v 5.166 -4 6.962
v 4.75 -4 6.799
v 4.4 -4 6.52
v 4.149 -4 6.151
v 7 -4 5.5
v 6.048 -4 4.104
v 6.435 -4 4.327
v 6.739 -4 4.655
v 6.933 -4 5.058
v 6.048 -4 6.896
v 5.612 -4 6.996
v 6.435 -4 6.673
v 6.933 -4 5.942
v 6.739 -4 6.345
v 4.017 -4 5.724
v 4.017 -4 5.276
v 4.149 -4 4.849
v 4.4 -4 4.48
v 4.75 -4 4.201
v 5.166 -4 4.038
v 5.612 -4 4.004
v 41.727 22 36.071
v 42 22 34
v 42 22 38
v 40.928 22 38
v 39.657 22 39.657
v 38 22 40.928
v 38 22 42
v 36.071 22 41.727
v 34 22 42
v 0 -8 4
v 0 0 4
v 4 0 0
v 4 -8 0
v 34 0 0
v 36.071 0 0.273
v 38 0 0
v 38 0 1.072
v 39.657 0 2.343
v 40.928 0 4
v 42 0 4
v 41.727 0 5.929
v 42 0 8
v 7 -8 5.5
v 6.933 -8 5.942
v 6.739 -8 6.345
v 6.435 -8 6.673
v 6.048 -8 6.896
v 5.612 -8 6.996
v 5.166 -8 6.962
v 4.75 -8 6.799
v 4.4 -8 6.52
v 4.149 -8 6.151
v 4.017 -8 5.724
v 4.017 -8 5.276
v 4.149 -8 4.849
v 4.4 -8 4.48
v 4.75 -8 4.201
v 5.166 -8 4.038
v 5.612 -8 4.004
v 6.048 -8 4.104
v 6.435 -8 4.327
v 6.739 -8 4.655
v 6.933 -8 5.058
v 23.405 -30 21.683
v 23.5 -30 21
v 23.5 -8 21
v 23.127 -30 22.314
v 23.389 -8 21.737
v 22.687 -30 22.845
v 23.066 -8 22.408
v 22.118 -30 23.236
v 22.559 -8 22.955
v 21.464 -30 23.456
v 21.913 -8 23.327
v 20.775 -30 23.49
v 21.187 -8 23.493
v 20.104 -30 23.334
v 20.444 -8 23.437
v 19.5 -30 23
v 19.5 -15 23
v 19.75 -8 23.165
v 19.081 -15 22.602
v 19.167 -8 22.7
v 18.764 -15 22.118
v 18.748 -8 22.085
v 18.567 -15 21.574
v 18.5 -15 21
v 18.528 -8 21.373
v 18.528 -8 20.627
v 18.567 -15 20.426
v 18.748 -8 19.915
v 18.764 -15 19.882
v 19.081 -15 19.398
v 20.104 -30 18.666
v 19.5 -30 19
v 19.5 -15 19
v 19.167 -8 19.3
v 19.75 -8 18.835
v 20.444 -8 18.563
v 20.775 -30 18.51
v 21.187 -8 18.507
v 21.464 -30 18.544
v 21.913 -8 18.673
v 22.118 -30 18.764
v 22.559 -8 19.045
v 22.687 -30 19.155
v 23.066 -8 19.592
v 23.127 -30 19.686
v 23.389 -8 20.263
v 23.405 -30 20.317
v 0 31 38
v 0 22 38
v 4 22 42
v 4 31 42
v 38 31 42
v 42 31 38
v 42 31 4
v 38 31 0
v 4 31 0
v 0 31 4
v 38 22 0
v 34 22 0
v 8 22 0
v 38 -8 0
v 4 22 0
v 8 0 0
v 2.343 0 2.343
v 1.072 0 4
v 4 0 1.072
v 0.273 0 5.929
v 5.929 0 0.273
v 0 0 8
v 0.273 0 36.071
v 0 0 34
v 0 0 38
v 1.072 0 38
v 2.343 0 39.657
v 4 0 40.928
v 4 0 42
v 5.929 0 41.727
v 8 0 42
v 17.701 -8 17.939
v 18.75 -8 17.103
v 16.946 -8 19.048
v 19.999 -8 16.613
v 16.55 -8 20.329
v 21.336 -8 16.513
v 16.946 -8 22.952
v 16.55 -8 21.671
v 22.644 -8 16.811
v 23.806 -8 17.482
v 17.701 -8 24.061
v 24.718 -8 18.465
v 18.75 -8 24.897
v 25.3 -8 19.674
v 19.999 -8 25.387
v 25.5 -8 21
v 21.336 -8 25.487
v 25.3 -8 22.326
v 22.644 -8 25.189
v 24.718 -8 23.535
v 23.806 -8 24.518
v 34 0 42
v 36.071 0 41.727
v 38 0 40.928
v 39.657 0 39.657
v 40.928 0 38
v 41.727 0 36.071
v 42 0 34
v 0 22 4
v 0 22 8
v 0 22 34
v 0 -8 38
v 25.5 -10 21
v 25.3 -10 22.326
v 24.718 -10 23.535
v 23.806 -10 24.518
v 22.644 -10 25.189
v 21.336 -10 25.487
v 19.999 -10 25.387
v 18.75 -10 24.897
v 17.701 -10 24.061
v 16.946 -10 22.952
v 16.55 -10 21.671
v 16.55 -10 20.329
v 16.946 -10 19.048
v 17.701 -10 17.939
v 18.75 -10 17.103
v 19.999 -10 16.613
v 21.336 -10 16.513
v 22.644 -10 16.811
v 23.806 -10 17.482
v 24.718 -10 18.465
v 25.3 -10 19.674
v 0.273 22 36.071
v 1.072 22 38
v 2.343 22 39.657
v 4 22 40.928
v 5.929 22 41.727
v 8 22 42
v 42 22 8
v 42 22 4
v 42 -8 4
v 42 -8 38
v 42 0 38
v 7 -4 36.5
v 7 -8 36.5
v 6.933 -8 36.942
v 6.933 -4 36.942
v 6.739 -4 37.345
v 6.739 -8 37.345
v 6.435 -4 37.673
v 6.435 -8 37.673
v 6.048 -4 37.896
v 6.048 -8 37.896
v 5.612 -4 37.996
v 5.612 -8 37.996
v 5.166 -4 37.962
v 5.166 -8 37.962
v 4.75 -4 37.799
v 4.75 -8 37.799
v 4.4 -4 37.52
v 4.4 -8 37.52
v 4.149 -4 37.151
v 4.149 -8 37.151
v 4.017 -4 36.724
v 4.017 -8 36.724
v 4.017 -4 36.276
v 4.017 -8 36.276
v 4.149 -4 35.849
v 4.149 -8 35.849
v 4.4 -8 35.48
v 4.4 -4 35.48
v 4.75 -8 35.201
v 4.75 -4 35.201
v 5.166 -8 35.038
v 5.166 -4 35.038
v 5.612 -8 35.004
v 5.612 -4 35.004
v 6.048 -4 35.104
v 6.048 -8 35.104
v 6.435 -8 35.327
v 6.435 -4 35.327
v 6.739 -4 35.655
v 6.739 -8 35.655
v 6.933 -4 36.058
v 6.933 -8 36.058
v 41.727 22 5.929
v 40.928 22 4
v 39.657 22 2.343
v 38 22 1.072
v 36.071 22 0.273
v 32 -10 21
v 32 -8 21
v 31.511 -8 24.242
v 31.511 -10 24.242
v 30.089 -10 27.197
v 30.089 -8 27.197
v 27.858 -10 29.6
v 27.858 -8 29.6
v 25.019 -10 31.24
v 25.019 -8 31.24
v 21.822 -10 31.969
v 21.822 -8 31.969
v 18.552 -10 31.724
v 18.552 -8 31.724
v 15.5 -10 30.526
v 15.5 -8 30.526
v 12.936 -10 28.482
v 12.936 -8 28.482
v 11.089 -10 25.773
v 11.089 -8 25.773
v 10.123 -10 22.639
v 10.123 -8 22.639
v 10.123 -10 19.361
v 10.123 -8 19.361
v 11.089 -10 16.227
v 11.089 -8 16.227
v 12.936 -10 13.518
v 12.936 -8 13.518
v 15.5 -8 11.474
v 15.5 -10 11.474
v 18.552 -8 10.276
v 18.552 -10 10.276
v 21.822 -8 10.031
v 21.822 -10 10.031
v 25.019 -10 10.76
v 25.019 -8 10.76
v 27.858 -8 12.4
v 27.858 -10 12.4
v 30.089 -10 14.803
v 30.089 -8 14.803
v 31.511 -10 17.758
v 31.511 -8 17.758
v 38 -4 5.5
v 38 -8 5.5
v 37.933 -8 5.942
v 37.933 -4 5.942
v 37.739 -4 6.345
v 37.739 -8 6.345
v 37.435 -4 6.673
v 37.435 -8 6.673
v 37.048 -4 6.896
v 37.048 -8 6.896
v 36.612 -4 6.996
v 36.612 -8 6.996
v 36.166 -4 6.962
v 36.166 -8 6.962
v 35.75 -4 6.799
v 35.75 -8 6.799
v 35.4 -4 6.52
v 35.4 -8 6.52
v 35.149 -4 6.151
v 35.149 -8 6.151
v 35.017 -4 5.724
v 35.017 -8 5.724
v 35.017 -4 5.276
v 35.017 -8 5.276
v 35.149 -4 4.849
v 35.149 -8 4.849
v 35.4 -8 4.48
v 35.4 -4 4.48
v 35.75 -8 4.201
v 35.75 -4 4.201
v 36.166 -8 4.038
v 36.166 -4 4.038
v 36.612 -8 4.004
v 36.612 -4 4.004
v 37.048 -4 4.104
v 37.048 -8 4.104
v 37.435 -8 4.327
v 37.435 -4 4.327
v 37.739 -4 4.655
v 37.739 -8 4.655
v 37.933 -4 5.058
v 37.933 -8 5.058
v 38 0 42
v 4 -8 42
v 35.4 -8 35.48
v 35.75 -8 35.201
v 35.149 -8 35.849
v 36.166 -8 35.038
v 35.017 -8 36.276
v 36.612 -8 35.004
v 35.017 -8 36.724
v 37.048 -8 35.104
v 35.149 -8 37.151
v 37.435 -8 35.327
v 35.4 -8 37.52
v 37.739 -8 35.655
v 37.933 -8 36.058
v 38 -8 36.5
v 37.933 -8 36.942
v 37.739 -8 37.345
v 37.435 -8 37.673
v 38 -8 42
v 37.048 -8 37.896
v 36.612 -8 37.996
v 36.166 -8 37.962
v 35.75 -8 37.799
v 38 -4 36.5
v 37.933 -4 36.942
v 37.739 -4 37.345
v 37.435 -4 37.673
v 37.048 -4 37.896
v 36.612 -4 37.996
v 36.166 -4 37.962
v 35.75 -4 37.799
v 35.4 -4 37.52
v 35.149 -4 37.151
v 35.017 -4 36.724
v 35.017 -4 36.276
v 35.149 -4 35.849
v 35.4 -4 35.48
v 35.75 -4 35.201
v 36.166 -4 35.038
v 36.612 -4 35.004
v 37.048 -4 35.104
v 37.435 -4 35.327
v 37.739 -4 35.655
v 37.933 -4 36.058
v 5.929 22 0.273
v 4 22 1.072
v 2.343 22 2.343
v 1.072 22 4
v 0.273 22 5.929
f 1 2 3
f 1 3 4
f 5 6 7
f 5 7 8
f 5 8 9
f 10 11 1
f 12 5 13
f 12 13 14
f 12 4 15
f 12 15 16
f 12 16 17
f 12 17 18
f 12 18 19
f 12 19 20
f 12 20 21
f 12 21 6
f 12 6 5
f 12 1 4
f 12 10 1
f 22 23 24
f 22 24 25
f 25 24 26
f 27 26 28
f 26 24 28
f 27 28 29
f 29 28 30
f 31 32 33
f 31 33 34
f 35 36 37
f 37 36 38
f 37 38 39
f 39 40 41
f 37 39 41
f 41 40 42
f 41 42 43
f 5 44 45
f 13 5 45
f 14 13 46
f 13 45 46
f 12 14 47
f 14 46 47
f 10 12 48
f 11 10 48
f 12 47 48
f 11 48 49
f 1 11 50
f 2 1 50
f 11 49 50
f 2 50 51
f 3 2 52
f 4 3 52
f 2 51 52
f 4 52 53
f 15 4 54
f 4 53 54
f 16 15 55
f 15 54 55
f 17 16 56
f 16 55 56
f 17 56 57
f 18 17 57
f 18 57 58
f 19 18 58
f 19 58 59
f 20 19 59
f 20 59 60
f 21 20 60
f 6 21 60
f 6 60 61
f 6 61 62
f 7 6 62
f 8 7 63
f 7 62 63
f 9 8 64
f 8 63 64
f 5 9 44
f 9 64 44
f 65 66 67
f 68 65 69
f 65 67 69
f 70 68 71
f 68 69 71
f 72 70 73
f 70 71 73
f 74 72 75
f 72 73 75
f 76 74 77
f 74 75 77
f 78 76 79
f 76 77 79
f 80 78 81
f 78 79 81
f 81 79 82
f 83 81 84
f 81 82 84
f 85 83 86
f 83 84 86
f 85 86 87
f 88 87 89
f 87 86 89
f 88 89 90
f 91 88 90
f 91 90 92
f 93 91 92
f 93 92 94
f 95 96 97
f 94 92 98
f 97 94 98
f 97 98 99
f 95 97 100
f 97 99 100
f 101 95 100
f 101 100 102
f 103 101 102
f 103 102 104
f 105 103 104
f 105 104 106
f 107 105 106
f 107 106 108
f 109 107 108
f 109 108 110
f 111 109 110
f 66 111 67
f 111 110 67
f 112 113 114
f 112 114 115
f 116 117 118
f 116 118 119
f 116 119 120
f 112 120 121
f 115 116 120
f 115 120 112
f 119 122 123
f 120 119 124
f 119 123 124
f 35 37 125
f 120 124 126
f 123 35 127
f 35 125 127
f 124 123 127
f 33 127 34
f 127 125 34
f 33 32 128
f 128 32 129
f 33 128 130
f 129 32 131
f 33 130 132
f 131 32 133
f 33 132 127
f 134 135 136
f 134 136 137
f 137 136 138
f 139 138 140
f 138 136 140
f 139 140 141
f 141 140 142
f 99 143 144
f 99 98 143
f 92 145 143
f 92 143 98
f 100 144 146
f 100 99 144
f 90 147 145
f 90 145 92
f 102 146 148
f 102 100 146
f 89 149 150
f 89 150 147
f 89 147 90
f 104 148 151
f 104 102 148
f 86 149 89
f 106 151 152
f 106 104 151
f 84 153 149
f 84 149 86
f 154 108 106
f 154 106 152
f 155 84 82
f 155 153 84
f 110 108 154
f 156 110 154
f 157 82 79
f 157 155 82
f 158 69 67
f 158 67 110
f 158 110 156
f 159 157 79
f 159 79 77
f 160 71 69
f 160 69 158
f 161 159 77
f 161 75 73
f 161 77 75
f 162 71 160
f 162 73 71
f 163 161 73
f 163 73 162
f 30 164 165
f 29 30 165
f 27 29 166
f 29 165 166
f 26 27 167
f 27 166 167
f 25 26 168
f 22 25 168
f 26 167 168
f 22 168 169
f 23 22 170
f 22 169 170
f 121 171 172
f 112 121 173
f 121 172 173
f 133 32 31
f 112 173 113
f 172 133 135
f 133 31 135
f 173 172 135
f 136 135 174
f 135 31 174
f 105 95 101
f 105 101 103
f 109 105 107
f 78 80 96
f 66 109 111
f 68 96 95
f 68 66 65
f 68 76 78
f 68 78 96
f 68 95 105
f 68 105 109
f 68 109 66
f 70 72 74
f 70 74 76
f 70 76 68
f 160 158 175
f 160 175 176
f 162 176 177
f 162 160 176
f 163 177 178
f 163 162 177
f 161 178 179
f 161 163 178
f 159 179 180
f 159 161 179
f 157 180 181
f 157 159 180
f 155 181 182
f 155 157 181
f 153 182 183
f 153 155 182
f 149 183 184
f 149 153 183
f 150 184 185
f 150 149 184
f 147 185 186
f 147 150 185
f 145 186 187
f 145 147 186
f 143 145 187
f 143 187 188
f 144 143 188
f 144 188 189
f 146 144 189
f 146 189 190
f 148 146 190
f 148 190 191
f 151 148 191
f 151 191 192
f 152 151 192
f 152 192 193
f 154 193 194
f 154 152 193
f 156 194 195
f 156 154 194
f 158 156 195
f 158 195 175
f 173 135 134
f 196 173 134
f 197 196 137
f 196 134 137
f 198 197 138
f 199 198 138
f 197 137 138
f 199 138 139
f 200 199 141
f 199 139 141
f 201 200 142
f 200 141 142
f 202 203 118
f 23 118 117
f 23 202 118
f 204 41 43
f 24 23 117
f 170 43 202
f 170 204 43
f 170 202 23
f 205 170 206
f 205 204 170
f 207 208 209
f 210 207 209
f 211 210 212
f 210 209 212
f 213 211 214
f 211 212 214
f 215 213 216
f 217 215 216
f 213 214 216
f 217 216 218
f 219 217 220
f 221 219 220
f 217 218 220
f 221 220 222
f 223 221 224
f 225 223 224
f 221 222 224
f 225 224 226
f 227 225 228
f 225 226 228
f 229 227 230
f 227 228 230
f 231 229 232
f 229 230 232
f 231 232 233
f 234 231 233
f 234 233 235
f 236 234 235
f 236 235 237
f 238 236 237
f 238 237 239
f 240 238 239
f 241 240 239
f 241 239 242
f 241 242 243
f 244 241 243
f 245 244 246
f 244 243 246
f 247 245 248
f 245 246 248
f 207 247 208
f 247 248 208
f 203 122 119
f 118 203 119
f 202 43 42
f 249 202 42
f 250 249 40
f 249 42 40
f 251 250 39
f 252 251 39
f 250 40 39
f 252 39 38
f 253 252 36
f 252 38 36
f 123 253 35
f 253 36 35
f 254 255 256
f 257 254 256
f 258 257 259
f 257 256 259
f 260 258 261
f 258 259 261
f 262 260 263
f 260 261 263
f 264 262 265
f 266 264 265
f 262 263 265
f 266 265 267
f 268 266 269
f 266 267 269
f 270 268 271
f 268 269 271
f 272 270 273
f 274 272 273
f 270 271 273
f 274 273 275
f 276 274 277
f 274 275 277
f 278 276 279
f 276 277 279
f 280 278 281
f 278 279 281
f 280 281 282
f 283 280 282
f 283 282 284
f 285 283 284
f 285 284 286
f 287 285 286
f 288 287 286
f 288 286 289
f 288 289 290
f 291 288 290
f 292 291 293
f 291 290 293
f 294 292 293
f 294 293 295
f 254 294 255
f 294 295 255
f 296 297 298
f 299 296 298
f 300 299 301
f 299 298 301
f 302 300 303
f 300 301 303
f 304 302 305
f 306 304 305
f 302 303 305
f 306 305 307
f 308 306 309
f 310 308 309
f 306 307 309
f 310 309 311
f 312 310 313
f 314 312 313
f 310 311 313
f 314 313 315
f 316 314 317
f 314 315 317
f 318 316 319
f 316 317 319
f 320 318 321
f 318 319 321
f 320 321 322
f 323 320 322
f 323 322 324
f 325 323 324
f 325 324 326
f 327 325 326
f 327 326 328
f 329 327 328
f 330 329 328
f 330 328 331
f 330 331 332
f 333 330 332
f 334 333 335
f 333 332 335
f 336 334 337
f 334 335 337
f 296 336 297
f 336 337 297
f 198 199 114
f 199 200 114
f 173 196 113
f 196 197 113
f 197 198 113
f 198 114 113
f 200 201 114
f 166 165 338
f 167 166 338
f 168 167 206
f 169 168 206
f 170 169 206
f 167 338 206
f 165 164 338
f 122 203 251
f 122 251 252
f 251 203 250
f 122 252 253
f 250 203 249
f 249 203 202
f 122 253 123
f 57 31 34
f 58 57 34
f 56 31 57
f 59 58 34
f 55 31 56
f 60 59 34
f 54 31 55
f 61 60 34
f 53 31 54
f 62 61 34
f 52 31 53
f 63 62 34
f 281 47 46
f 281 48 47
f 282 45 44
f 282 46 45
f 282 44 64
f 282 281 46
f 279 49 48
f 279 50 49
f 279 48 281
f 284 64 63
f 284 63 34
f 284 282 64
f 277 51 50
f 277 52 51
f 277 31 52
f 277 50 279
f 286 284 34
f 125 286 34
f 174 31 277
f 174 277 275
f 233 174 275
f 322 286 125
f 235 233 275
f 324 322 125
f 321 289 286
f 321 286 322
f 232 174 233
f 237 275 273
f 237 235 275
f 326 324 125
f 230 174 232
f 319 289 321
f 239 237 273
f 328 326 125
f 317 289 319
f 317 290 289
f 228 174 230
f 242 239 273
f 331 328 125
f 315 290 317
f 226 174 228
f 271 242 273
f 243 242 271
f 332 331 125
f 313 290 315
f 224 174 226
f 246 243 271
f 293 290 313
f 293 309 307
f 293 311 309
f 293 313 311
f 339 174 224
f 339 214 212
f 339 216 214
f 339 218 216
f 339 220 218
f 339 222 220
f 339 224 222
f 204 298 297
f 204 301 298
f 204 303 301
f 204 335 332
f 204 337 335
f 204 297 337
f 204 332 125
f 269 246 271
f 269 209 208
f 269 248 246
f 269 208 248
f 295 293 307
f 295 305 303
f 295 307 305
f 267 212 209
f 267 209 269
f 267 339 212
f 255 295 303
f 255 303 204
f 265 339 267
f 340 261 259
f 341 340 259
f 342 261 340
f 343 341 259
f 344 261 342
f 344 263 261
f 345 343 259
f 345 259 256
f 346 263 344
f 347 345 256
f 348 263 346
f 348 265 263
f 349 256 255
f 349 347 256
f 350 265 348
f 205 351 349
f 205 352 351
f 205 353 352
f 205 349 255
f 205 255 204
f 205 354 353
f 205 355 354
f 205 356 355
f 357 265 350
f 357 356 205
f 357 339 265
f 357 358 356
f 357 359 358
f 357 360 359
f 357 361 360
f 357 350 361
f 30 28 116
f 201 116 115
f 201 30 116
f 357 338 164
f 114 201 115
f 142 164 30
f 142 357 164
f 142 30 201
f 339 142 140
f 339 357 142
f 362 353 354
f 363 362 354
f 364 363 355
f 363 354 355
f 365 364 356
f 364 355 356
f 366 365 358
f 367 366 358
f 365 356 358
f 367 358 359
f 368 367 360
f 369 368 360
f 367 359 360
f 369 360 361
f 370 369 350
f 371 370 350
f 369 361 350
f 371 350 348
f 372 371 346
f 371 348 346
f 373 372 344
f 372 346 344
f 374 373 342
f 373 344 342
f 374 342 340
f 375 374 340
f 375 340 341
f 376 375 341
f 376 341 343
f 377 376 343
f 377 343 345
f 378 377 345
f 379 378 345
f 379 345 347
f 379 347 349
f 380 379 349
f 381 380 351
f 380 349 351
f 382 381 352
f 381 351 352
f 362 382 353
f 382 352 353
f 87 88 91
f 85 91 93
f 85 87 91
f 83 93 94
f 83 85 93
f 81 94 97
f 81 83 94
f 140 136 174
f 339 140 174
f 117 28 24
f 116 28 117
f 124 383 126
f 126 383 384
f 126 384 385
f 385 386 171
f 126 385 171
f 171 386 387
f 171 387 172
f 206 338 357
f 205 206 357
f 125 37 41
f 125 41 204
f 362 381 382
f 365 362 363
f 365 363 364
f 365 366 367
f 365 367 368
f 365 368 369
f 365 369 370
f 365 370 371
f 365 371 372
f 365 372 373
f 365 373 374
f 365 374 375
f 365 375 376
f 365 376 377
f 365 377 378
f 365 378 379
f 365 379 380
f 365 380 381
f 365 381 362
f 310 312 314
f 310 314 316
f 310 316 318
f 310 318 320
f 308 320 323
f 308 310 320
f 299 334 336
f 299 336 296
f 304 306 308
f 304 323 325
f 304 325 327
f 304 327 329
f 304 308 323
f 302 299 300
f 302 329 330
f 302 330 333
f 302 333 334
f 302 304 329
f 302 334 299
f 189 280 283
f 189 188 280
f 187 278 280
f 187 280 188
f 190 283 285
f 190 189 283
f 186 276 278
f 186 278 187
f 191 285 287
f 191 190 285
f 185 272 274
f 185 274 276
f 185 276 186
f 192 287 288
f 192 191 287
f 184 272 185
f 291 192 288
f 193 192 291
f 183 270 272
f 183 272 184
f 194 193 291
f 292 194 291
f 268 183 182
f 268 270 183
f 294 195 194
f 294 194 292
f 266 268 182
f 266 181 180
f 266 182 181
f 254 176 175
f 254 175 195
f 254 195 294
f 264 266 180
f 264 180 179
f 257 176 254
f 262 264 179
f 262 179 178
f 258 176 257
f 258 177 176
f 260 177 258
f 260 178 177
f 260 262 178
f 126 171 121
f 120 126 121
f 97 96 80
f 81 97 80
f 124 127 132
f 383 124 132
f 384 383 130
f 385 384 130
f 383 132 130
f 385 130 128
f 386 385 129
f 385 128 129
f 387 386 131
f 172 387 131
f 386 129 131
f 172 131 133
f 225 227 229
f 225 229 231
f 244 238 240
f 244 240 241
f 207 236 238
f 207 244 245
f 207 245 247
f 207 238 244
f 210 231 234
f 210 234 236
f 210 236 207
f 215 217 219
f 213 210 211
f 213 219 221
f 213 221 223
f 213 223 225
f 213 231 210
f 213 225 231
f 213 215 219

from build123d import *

# Parameters (mm, degrees)
F0_W      = 42
F0_H      = 42
F1_DEPTH  = 8
F3_DEPTH  = 22
F4_W      = 42
F4_H      = 42
F5_DEPTH  = 9
F6_R      = 11
F6_R_2    = 4.5
F7_DEPTH  = 2
F8_R      = 2.5
F9_DEPTH  = 22
F11_DEPTH = 15
F12_R     = 1.5
F13_DEPTH = 4
F14_SIZE  = 4


with BuildPart() as f1:
    # F0 (on Front) → F1 (new body)
    with BuildSketch(Plane.XZ):
        with Locations((21, 21)):
            Rectangle(F0_W, F0_H)
    extrude(amount=F1_DEPTH)

    # F2 (on face) → F3 (join)
    with BuildSketch(Plane(origin=(0, 0, 0), x_dir=(-1, 0, 0), z_dir=(0, 1, 0))):
        with BuildLine():
            Line((0, 8), (0, 21))
            Line((0, 21), (0, 34))
            ThreePointArc((0, 34), (-2.3431457505, 39.6568542495), (-8, 42))
            Line((-8, 42), (-21, 42))
            Line((-21, 42), (-34, 42))
            ThreePointArc((-34, 42), (-39.6568542495, 39.6568542495), (-42, 34))
            Line((-42, 34), (-42, 21))
            Line((-42, 21), (-42, 8))
            ThreePointArc((-42, 8), (-39.6568542495, 2.3431457505), (-34, 0))
            Line((-34, 0), (-21, 0))
            Line((-21, 0), (-8, 0))
            ThreePointArc((-8, 0), (-2.3431457505, 2.3431457505), (0, 8))
        make_face()
    extrude(amount=F3_DEPTH)

    # F4 (on face) → F5 (join)
    with BuildSketch(Plane(origin=(0, 22, 0), x_dir=(-1, 0, 0), z_dir=(0, 1, 0))):
        with Locations((-21, 21)):
            Rectangle(F4_W, F4_H)
    extrude(amount=F5_DEPTH)

    # F6 (on face) → F7 (join)
    with BuildSketch(Plane.XZ.offset(8)):
        with Locations((21, 21)):
            Circle(F6_R)
        with Locations((21, 21)):
            Circle(F6_R_2, mode=Mode.SUBTRACT)
    extrude(amount=F7_DEPTH)

    # F8 (on face) → F9 (join)
    with BuildSketch(Plane.XZ.offset(8)):
        with Locations((21, 21)):
            Circle(F8_R)
    extrude(amount=F9_DEPTH)

    # F10 (on face) → F11 (cut)
    with BuildSketch(Plane.XZ.offset(30)):
        with BuildLine():
            Line((19.5, 19), (19.5, 23))
            ThreePointArc((19.5, 23), (18.7639320225, 22.1180339887), (18.5, 21))
            ThreePointArc((18.5, 21), (18.7639320225, 19.8819660113), (19.5, 19))
        make_face()
    extrude(amount=-F11_DEPTH, mode=Mode.SUBTRACT)

    # F12 (on face) → F13 (cut)
    with BuildSketch(Plane.XZ.offset(8)):
        with Locations((5.5, 5.5)):
            Circle(F12_R)
        with Locations((5.5, 36.5)):
            Circle(F12_R)
        with Locations((36.5, 36.5)):
            Circle(F12_R)
        with Locations((36.5, 5.5)):
            Circle(F12_R)
    extrude(amount=-F13_DEPTH, mode=Mode.SUBTRACT)

    # F14
    f14_edges = [f1.edges().sort_by_distance(p)[0] for p in [
        (0, -4, 42),
        (0, 26.5, 42),
        (42, -4, 42),
        (42, 26.5, 42),
        (42, 26.5, 0),
        (42, -4, 0),
        (0, -4, 0),
        (0, 26.5, 0),
    ]]
    chamfer(f14_edges, length=F14_SIZE)


solid = f1.part
